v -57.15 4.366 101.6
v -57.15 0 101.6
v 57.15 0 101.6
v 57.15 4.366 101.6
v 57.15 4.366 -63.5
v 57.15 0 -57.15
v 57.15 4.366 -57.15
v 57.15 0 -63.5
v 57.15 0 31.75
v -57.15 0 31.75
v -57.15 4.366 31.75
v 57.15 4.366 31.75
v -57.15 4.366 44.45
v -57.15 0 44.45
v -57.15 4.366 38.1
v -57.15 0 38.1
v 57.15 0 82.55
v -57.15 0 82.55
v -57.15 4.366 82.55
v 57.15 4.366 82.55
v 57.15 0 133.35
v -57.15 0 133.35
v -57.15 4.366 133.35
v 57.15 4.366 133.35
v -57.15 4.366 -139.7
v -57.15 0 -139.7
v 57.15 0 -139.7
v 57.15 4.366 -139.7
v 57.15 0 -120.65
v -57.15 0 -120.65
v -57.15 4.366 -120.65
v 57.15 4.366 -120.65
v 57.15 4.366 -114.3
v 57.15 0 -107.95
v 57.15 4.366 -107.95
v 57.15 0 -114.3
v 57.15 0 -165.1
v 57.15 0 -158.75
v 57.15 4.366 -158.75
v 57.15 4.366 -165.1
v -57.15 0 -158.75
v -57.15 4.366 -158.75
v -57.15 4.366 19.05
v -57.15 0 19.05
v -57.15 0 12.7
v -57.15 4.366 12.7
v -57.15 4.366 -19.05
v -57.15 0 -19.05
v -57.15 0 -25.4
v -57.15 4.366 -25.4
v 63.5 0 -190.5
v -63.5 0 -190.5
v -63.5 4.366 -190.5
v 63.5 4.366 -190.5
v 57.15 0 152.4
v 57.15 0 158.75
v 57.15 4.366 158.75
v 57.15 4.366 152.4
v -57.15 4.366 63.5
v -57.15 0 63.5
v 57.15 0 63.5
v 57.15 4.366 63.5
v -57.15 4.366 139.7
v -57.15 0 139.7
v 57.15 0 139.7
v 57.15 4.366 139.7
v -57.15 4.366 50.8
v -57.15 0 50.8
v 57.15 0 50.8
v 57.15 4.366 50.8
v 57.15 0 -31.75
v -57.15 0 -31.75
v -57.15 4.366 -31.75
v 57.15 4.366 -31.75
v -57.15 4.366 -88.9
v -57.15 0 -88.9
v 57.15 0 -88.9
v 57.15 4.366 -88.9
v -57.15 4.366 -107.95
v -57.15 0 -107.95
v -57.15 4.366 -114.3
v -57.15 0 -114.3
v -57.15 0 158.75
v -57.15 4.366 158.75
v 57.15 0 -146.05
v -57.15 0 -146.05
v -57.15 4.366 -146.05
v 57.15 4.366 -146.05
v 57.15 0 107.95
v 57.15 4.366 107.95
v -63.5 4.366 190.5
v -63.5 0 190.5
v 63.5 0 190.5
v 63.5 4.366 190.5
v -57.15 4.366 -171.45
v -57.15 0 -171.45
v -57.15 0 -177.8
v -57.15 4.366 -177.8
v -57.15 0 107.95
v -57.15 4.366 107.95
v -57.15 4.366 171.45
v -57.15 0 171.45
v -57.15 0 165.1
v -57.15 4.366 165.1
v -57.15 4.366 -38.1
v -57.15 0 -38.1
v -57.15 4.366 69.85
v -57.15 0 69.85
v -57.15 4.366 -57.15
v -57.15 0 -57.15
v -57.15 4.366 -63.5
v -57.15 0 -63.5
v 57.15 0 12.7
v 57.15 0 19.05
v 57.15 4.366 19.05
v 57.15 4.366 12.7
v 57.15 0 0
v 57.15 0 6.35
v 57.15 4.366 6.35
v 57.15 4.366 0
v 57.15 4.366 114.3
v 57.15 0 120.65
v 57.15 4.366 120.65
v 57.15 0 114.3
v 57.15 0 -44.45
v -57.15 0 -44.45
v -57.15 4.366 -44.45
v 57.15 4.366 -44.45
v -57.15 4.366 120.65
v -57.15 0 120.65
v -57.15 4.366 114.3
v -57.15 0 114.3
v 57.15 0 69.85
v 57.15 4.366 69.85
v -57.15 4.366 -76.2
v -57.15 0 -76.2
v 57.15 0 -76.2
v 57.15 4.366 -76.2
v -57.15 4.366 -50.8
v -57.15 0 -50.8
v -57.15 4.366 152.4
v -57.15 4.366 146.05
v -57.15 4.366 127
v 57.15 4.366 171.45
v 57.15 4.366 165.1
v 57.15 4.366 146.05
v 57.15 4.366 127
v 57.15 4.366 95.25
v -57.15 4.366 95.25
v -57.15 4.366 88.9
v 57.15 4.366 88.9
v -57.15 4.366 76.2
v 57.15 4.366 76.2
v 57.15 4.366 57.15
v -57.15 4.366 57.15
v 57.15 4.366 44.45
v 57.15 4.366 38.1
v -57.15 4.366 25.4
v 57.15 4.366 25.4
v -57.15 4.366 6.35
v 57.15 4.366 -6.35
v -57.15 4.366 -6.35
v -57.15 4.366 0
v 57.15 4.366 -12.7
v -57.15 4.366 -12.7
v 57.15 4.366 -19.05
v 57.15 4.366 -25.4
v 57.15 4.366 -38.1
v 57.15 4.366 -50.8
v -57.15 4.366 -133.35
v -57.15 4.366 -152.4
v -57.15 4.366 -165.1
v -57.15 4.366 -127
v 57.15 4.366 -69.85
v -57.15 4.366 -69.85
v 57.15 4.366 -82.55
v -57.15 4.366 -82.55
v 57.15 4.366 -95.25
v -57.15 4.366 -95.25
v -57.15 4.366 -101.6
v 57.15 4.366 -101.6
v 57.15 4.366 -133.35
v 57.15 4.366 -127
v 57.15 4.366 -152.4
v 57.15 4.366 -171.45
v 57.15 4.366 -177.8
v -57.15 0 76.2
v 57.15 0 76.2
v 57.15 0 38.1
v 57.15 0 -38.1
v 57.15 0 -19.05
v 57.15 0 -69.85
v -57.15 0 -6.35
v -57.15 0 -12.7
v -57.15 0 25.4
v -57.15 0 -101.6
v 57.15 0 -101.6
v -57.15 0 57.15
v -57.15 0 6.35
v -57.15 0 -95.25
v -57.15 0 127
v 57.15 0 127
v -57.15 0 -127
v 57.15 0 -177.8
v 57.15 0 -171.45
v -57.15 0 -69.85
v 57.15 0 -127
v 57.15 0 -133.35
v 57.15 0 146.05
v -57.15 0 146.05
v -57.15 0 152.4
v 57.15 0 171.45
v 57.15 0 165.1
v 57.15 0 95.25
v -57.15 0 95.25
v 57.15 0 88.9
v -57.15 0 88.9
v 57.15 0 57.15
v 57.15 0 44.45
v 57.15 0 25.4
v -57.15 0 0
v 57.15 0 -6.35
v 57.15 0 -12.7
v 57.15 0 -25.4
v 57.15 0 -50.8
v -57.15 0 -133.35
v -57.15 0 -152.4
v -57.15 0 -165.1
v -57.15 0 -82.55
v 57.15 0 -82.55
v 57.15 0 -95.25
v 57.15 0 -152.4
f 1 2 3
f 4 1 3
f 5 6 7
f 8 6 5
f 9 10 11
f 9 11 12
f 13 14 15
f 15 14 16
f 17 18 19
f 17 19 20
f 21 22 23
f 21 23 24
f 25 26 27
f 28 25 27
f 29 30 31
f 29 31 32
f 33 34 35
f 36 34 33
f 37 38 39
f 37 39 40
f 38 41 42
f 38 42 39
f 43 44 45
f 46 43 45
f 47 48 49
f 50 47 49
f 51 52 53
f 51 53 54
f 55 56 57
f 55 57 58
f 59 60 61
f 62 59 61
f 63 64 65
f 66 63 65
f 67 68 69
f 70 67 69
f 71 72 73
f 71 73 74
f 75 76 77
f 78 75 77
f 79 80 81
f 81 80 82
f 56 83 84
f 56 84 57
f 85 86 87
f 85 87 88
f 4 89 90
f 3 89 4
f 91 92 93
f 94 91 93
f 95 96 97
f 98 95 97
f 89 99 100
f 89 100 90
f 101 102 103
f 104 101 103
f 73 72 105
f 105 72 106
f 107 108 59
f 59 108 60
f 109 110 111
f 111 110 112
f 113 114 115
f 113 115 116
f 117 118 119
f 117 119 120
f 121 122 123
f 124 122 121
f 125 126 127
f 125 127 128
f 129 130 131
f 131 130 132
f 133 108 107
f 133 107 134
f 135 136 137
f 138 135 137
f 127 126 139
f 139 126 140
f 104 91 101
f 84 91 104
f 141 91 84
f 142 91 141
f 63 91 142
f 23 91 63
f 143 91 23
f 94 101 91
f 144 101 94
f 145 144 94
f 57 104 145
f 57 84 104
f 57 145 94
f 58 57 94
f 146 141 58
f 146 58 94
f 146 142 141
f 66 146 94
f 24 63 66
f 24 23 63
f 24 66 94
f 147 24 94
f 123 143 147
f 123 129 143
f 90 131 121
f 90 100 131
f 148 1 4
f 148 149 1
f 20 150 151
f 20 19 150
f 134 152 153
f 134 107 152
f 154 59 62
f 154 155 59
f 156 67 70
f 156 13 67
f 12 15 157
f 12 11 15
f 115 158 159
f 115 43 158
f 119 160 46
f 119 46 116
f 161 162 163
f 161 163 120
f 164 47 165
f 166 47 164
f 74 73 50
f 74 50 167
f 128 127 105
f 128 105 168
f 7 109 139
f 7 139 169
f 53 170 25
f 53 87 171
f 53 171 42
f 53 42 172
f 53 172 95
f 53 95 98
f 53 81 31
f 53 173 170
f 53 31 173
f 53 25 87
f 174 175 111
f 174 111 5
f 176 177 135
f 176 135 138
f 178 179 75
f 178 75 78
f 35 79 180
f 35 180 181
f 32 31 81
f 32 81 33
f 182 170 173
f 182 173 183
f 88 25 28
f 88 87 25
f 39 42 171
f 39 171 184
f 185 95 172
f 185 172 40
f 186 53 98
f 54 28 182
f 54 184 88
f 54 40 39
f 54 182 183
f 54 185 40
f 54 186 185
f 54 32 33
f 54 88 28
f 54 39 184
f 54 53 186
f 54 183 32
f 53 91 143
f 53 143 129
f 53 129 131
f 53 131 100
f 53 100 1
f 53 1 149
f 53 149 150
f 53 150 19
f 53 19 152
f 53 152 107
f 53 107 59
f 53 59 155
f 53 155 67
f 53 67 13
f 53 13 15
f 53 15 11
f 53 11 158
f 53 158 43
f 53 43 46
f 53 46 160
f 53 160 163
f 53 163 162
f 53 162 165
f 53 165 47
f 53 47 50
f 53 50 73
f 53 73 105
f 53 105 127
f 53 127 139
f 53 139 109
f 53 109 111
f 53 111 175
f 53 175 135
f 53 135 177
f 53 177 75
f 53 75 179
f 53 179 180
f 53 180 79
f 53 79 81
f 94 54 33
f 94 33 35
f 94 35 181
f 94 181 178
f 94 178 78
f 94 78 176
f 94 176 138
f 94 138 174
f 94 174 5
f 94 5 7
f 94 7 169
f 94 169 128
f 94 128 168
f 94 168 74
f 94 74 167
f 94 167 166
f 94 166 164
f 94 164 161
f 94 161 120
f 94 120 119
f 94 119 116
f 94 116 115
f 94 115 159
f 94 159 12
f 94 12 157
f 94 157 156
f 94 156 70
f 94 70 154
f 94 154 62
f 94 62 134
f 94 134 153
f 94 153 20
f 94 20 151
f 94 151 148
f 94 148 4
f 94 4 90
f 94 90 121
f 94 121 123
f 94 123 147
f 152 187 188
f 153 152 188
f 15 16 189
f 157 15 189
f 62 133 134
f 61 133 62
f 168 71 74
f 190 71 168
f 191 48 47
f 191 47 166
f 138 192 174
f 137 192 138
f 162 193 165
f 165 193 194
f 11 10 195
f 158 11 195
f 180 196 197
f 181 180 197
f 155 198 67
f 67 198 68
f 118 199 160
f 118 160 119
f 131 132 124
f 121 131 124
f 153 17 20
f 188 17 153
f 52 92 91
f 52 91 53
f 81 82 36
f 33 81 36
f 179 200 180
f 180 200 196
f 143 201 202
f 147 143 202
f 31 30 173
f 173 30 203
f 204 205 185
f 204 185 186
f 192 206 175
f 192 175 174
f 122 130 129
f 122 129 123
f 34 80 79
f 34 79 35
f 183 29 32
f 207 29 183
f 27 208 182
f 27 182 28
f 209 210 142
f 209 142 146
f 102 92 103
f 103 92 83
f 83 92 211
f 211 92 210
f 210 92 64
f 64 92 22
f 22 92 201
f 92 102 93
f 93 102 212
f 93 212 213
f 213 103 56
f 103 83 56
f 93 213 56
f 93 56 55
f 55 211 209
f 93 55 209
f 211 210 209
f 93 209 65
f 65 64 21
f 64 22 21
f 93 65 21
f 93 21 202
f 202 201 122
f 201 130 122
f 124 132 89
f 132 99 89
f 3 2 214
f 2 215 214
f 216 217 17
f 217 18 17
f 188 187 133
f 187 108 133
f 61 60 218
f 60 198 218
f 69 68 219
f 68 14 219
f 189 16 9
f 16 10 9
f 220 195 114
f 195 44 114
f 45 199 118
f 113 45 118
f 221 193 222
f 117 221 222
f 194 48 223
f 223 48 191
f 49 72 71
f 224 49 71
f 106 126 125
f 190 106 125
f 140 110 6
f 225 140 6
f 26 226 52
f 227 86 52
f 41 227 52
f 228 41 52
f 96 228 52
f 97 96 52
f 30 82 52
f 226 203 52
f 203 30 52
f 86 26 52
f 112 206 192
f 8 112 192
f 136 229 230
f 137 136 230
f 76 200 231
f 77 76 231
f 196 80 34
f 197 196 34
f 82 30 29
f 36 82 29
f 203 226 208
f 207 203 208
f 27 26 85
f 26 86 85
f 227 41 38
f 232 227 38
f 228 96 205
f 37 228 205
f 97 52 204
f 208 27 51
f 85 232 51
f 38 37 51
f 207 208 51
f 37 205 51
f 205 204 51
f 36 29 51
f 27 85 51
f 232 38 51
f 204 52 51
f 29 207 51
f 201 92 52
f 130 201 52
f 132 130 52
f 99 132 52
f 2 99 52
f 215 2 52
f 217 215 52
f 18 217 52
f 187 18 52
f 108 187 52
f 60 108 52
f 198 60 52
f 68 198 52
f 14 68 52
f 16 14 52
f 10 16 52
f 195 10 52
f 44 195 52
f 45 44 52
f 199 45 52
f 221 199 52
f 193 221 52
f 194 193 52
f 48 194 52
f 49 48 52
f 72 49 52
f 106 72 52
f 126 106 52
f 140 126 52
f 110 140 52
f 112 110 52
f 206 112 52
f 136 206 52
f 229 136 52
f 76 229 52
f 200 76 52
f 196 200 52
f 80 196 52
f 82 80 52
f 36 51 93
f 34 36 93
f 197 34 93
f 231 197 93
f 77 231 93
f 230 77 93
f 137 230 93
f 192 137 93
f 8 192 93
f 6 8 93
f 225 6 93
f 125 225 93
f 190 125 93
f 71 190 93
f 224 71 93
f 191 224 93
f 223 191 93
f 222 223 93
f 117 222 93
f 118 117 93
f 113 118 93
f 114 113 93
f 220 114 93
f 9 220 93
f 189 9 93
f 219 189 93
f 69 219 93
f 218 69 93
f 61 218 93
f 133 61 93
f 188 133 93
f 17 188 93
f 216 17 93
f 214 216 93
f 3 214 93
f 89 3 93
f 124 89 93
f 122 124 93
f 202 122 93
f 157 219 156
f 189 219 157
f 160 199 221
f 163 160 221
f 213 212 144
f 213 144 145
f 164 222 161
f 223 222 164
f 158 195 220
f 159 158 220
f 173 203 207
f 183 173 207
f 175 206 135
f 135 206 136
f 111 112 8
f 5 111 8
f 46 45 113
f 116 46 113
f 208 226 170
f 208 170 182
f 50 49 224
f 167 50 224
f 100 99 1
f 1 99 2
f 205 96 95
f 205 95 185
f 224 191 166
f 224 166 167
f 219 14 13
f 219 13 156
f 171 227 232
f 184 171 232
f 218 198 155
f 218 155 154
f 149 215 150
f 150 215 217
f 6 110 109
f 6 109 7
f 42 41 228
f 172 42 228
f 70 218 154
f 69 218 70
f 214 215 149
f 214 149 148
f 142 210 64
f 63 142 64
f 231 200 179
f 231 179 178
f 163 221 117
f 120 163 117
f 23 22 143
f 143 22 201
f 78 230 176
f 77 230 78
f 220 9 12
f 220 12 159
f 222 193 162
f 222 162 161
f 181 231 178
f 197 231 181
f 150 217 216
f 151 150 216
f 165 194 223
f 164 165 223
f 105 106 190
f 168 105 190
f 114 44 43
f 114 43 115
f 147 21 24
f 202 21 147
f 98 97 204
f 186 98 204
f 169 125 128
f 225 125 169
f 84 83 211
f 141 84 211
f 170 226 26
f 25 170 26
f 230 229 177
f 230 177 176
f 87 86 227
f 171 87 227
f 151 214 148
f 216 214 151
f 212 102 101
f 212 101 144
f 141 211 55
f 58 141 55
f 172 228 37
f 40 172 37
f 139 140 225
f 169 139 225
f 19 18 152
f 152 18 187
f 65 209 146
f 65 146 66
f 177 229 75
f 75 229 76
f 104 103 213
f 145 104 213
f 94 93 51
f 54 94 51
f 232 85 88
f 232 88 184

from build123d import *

# Parameters (mm, degrees)
SKETCH1_W           = 127
SKETCH1_H           = 381
SKETCH1_W_2         = 114.3
SKETCH1_H_2         = 6.35
BOSS_EXTRUDE1_DEPTH = 4.365625


with BuildPart() as part:
    # Sketch1 → Boss-Extrude1 (new body)
    with BuildSketch(Plane(origin=(0, 0, 0), x_dir=(1, 0, 0), z_dir=(0, 1, 0))):
        Rectangle(SKETCH1_W, SKETCH1_H)
        with Locations((0, 161.925)):
            Rectangle(SKETCH1_W_2, SKETCH1_H_2, mode=Mode.SUBTRACT)
        with Locations((0, 174.625)):
            Rectangle(SKETCH1_W_2, SKETCH1_H_2, mode=Mode.SUBTRACT)
        with Locations((0, 149.225)):
            Rectangle(SKETCH1_W_2, SKETCH1_H_2, mode=Mode.SUBTRACT)
        with Locations((0, 136.525)):
            Rectangle(SKETCH1_W_2, SKETCH1_H_2, mode=Mode.SUBTRACT)
        with Locations((0, 123.825)):
            Rectangle(SKETCH1_W_2, SKETCH1_H_2, mode=Mode.SUBTRACT)
        with Locations((0, 111.125)):
            Rectangle(SKETCH1_W_2, SKETCH1_H_2, mode=Mode.SUBTRACT)
        with Locations((0, 98.425)):
            Rectangle(SKETCH1_W_2, SKETCH1_H_2, mode=Mode.SUBTRACT)
        with Locations((0, 85.725)):
            Rectangle(SKETCH1_W_2, SKETCH1_H_2, mode=Mode.SUBTRACT)
        with Locations((0, 73.025)):
            Rectangle(SKETCH1_W_2, SKETCH1_H_2, mode=Mode.SUBTRACT)
        with Locations((0, 60.325)):
            Rectangle(SKETCH1_W_2, SKETCH1_H_2, mode=Mode.SUBTRACT)
        with Locations((0, 47.625)):
            Rectangle(SKETCH1_W_2, SKETCH1_H_2, mode=Mode.SUBTRACT)
        with Locations((0, 34.925)):
            Rectangle(SKETCH1_W_2, SKETCH1_H_2, mode=Mode.SUBTRACT)
        with Locations((0, 22.225)):
            Rectangle(SKETCH1_W_2, SKETCH1_H_2, mode=Mode.SUBTRACT)
        with Locations((0, 9.525)):
            Rectangle(SKETCH1_W_2, SKETCH1_H_2, mode=Mode.SUBTRACT)
        with Locations((0, -3.175)):
            Rectangle(SKETCH1_W_2, SKETCH1_H_2, mode=Mode.SUBTRACT)
        with Locations((0, -15.875)):
            Rectangle(SKETCH1_W_2, SKETCH1_H_2, mode=Mode.SUBTRACT)
        with Locations((0, -28.575)):
            Rectangle(SKETCH1_W_2, SKETCH1_H_2, mode=Mode.SUBTRACT)
        with Locations((0, -41.275)):
            Rectangle(SKETCH1_W_2, SKETCH1_H_2, mode=Mode.SUBTRACT)
        with Locations((0, -53.975)):
            Rectangle(SKETCH1_W_2, SKETCH1_H_2, mode=Mode.SUBTRACT)
        with Locations((0, -66.675)):
            Rectangle(SKETCH1_W_2, SKETCH1_H_2, mode=Mode.SUBTRACT)
        with Locations((0, -79.375)):
            Rectangle(SKETCH1_W_2, SKETCH1_H_2, mode=Mode.SUBTRACT)
        with Locations((0, -92.075)):
            Rectangle(SKETCH1_W_2, SKETCH1_H_2, mode=Mode.SUBTRACT)
        with Locations((0, -104.775)):
            Rectangle(SKETCH1_W_2, SKETCH1_H_2, mode=Mode.SUBTRACT)
        with Locations((0, -117.475)):
            Rectangle(SKETCH1_W_2, SKETCH1_H_2, mode=Mode.SUBTRACT)
        with Locations((0, -130.175)):
            Rectangle(SKETCH1_W_2, SKETCH1_H_2, mode=Mode.SUBTRACT)
        with Locations((0, -142.875)):
            Rectangle(SKETCH1_W_2, SKETCH1_H_2, mode=Mode.SUBTRACT)
        with Locations((0, -155.575)):
            Rectangle(SKETCH1_W_2, SKETCH1_H_2, mode=Mode.SUBTRACT)
        with Locations((0, -168.275)):
            Rectangle(SKETCH1_W_2, SKETCH1_H_2, mode=Mode.SUBTRACT)
    extrude(amount=BOSS_EXTRUDE1_DEPTH)


solid = part.part
